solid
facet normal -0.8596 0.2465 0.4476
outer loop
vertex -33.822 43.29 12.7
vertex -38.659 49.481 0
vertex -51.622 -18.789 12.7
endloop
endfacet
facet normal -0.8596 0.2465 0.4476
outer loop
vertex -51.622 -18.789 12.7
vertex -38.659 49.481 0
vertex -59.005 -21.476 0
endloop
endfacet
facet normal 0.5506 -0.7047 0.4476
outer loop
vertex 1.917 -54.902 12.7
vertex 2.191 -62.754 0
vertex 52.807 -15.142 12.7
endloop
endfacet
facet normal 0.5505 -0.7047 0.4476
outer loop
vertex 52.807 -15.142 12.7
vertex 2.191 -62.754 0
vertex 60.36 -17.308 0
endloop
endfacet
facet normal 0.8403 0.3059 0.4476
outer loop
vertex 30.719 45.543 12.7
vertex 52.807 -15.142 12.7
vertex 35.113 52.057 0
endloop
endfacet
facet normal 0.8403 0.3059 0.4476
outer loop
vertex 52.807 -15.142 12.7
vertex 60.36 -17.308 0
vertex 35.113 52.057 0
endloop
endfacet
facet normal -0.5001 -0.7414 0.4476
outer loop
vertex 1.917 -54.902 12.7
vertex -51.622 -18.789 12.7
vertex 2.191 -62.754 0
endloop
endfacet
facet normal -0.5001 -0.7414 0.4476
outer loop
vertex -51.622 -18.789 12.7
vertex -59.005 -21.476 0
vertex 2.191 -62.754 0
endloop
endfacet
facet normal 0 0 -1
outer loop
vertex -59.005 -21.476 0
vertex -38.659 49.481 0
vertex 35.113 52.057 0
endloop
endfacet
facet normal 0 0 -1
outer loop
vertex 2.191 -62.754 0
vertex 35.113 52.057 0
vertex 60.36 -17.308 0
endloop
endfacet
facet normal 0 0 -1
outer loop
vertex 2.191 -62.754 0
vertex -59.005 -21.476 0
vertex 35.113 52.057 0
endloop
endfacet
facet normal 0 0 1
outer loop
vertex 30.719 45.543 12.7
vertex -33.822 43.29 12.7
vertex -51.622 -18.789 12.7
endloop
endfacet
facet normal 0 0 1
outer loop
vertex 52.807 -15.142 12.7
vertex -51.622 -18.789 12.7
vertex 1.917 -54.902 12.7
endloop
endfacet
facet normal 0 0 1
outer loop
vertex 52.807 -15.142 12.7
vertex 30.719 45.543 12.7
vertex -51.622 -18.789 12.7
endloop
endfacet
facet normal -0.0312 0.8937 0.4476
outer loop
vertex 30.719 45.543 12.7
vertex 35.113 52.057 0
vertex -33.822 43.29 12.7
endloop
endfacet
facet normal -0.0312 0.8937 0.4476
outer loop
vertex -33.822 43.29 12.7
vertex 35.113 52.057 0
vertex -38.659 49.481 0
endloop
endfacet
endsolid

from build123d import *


with BuildPart() as f3:
    # F2 (on offset) → F3 section 0
    with BuildSketch(Plane.XY.offset(12.7)):
        Polygon((-33.821593, 43.289665), (-51.622365, -18.789004), (1.917217, -54.901909), (52.807271, -15.142241), (30.719471, 45.543489), align=None)
    # F0 (on Top) → F3 section 1
    with BuildSketch(Plane.XY):
        Polygon((35.112982, 52.057137), (-38.658771, 49.480971), (-59.005417, -21.476215), (2.191418, -62.754002), (60.359788, -17.307891), align=None)
    loft()


solid = f3.part
